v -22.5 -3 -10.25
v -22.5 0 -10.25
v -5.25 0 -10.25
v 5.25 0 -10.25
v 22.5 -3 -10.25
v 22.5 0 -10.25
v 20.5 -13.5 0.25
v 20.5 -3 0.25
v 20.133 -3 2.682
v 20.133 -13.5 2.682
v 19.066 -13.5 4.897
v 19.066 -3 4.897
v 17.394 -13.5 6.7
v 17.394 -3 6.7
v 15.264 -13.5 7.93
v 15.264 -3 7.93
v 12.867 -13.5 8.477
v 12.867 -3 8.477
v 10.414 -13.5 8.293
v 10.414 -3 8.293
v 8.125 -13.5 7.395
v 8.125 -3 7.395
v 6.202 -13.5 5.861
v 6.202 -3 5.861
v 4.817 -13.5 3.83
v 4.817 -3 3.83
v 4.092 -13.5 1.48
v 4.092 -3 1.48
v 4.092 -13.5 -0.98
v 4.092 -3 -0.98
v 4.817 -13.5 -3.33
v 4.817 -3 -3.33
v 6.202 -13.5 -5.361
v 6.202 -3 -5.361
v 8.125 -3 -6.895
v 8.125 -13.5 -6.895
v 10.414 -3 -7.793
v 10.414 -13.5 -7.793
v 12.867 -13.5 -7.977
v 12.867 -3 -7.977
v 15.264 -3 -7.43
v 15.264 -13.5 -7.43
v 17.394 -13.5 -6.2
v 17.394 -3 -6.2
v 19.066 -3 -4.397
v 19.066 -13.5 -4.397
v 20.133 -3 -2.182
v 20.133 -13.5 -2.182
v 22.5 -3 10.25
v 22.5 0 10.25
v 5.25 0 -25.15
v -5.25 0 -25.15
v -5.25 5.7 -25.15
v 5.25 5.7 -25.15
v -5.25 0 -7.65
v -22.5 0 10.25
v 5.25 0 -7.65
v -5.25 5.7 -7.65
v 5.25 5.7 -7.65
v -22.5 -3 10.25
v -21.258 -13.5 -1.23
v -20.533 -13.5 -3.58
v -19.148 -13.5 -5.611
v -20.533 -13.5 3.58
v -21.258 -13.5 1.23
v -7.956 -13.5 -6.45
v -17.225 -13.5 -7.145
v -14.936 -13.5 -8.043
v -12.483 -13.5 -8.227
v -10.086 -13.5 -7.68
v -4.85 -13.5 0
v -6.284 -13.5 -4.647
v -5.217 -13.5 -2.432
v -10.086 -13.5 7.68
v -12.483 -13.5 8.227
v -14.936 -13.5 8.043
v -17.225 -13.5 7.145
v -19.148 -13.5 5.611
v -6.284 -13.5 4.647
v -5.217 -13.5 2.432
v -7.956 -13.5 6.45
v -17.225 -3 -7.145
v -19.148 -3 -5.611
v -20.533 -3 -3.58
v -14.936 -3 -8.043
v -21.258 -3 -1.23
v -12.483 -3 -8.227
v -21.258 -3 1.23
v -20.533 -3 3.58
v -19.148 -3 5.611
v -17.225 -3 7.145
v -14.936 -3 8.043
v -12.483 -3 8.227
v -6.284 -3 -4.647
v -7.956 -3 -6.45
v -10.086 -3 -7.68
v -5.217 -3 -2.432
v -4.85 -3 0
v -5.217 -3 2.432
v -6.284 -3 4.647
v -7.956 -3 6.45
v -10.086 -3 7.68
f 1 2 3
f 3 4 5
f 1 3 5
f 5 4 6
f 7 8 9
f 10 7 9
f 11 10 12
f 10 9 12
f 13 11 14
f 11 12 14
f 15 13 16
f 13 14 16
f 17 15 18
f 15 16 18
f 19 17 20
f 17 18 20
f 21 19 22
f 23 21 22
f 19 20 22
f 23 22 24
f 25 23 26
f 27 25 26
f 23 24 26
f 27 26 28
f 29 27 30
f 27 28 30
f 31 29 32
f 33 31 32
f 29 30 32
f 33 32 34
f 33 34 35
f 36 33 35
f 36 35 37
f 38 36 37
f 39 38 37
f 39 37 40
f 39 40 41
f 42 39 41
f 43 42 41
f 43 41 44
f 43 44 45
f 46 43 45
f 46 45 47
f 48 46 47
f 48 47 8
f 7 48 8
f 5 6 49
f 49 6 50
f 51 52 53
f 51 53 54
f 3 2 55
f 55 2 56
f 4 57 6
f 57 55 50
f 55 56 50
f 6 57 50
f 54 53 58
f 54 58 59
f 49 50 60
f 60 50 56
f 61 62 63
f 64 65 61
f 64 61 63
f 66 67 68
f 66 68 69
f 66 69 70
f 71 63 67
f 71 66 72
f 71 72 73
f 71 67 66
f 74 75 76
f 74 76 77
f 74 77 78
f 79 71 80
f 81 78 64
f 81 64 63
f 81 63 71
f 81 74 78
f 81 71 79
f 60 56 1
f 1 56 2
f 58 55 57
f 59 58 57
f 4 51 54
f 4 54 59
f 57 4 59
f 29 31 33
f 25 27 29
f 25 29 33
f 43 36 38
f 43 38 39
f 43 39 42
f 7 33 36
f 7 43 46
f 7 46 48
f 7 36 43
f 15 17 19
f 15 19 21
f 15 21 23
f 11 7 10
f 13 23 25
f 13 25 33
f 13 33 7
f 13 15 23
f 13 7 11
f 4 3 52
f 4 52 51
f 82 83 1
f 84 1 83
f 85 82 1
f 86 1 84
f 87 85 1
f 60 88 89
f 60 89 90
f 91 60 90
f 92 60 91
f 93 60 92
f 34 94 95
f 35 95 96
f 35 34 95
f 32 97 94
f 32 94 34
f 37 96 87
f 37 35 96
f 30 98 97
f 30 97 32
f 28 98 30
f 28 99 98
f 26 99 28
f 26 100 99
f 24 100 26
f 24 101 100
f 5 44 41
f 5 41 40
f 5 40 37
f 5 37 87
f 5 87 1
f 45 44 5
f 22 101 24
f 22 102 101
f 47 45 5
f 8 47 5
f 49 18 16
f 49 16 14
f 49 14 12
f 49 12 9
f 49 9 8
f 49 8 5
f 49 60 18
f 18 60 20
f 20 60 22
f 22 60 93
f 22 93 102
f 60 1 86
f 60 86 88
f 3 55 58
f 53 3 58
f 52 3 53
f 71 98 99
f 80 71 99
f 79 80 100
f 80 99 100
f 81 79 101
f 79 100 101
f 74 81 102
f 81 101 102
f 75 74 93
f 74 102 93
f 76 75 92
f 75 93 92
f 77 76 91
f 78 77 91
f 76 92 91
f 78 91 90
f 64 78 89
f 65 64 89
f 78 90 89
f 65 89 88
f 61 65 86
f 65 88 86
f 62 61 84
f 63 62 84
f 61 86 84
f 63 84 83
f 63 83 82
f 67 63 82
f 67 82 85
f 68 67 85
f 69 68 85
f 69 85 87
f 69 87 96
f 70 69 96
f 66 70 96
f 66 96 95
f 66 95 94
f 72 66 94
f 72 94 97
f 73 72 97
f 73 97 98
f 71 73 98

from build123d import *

# Parameters (mm, degrees)
F0_R     = 8.25
F0_W     = 10.5
F0_H     = 2.6
F1_DEPTH = 3
F0_H_2   = 14.9
F2_DEPTH = 5.7
F3_DEPTH = 13.5


with BuildPart() as f1:
    # F0 (on Front) → F1 (new body)
    with BuildSketch(Plane.XZ):
        Polygon((22.5, -10.25), (22.5, 10.25), (-22.5, 10.25), (-22.5, -10.25), (-5.25, -10.25), (-5.25, -7.65), (5.25, -7.65), (5.25, -10.25), align=None)
        with Locations((-13.1, 0)):
            Circle(F0_R, mode=Mode.SUBTRACT)
        with Locations((12.25, 0.25)):
            Circle(F0_R, mode=Mode.SUBTRACT)
        with Locations((0, -8.95)):
            Rectangle(F0_W, F0_H)
        with Locations((-13.1, 0)):
            Circle(F0_R)
        with Locations((12.25, 0.25)):
            Circle(F0_R)
    extrude(amount=F1_DEPTH)

    # F0 (on Front) → F2 (join)
    with BuildSketch(Plane.XZ):
        with Locations((0, -8.95)):
            Rectangle(F0_W, F0_H)
        with Locations((0, -17.7)):
            Rectangle(F0_W, F0_H_2)
    extrude(amount=-F2_DEPTH)

    # F0 (on Front) → F3 (join)
    with BuildSketch(Plane.XZ):
        with Locations((-13.1, 0)):
            Circle(F0_R)
        with Locations((12.25, 0.25)):
            Circle(F0_R)
    extrude(amount=F3_DEPTH)


solid = f1.part
